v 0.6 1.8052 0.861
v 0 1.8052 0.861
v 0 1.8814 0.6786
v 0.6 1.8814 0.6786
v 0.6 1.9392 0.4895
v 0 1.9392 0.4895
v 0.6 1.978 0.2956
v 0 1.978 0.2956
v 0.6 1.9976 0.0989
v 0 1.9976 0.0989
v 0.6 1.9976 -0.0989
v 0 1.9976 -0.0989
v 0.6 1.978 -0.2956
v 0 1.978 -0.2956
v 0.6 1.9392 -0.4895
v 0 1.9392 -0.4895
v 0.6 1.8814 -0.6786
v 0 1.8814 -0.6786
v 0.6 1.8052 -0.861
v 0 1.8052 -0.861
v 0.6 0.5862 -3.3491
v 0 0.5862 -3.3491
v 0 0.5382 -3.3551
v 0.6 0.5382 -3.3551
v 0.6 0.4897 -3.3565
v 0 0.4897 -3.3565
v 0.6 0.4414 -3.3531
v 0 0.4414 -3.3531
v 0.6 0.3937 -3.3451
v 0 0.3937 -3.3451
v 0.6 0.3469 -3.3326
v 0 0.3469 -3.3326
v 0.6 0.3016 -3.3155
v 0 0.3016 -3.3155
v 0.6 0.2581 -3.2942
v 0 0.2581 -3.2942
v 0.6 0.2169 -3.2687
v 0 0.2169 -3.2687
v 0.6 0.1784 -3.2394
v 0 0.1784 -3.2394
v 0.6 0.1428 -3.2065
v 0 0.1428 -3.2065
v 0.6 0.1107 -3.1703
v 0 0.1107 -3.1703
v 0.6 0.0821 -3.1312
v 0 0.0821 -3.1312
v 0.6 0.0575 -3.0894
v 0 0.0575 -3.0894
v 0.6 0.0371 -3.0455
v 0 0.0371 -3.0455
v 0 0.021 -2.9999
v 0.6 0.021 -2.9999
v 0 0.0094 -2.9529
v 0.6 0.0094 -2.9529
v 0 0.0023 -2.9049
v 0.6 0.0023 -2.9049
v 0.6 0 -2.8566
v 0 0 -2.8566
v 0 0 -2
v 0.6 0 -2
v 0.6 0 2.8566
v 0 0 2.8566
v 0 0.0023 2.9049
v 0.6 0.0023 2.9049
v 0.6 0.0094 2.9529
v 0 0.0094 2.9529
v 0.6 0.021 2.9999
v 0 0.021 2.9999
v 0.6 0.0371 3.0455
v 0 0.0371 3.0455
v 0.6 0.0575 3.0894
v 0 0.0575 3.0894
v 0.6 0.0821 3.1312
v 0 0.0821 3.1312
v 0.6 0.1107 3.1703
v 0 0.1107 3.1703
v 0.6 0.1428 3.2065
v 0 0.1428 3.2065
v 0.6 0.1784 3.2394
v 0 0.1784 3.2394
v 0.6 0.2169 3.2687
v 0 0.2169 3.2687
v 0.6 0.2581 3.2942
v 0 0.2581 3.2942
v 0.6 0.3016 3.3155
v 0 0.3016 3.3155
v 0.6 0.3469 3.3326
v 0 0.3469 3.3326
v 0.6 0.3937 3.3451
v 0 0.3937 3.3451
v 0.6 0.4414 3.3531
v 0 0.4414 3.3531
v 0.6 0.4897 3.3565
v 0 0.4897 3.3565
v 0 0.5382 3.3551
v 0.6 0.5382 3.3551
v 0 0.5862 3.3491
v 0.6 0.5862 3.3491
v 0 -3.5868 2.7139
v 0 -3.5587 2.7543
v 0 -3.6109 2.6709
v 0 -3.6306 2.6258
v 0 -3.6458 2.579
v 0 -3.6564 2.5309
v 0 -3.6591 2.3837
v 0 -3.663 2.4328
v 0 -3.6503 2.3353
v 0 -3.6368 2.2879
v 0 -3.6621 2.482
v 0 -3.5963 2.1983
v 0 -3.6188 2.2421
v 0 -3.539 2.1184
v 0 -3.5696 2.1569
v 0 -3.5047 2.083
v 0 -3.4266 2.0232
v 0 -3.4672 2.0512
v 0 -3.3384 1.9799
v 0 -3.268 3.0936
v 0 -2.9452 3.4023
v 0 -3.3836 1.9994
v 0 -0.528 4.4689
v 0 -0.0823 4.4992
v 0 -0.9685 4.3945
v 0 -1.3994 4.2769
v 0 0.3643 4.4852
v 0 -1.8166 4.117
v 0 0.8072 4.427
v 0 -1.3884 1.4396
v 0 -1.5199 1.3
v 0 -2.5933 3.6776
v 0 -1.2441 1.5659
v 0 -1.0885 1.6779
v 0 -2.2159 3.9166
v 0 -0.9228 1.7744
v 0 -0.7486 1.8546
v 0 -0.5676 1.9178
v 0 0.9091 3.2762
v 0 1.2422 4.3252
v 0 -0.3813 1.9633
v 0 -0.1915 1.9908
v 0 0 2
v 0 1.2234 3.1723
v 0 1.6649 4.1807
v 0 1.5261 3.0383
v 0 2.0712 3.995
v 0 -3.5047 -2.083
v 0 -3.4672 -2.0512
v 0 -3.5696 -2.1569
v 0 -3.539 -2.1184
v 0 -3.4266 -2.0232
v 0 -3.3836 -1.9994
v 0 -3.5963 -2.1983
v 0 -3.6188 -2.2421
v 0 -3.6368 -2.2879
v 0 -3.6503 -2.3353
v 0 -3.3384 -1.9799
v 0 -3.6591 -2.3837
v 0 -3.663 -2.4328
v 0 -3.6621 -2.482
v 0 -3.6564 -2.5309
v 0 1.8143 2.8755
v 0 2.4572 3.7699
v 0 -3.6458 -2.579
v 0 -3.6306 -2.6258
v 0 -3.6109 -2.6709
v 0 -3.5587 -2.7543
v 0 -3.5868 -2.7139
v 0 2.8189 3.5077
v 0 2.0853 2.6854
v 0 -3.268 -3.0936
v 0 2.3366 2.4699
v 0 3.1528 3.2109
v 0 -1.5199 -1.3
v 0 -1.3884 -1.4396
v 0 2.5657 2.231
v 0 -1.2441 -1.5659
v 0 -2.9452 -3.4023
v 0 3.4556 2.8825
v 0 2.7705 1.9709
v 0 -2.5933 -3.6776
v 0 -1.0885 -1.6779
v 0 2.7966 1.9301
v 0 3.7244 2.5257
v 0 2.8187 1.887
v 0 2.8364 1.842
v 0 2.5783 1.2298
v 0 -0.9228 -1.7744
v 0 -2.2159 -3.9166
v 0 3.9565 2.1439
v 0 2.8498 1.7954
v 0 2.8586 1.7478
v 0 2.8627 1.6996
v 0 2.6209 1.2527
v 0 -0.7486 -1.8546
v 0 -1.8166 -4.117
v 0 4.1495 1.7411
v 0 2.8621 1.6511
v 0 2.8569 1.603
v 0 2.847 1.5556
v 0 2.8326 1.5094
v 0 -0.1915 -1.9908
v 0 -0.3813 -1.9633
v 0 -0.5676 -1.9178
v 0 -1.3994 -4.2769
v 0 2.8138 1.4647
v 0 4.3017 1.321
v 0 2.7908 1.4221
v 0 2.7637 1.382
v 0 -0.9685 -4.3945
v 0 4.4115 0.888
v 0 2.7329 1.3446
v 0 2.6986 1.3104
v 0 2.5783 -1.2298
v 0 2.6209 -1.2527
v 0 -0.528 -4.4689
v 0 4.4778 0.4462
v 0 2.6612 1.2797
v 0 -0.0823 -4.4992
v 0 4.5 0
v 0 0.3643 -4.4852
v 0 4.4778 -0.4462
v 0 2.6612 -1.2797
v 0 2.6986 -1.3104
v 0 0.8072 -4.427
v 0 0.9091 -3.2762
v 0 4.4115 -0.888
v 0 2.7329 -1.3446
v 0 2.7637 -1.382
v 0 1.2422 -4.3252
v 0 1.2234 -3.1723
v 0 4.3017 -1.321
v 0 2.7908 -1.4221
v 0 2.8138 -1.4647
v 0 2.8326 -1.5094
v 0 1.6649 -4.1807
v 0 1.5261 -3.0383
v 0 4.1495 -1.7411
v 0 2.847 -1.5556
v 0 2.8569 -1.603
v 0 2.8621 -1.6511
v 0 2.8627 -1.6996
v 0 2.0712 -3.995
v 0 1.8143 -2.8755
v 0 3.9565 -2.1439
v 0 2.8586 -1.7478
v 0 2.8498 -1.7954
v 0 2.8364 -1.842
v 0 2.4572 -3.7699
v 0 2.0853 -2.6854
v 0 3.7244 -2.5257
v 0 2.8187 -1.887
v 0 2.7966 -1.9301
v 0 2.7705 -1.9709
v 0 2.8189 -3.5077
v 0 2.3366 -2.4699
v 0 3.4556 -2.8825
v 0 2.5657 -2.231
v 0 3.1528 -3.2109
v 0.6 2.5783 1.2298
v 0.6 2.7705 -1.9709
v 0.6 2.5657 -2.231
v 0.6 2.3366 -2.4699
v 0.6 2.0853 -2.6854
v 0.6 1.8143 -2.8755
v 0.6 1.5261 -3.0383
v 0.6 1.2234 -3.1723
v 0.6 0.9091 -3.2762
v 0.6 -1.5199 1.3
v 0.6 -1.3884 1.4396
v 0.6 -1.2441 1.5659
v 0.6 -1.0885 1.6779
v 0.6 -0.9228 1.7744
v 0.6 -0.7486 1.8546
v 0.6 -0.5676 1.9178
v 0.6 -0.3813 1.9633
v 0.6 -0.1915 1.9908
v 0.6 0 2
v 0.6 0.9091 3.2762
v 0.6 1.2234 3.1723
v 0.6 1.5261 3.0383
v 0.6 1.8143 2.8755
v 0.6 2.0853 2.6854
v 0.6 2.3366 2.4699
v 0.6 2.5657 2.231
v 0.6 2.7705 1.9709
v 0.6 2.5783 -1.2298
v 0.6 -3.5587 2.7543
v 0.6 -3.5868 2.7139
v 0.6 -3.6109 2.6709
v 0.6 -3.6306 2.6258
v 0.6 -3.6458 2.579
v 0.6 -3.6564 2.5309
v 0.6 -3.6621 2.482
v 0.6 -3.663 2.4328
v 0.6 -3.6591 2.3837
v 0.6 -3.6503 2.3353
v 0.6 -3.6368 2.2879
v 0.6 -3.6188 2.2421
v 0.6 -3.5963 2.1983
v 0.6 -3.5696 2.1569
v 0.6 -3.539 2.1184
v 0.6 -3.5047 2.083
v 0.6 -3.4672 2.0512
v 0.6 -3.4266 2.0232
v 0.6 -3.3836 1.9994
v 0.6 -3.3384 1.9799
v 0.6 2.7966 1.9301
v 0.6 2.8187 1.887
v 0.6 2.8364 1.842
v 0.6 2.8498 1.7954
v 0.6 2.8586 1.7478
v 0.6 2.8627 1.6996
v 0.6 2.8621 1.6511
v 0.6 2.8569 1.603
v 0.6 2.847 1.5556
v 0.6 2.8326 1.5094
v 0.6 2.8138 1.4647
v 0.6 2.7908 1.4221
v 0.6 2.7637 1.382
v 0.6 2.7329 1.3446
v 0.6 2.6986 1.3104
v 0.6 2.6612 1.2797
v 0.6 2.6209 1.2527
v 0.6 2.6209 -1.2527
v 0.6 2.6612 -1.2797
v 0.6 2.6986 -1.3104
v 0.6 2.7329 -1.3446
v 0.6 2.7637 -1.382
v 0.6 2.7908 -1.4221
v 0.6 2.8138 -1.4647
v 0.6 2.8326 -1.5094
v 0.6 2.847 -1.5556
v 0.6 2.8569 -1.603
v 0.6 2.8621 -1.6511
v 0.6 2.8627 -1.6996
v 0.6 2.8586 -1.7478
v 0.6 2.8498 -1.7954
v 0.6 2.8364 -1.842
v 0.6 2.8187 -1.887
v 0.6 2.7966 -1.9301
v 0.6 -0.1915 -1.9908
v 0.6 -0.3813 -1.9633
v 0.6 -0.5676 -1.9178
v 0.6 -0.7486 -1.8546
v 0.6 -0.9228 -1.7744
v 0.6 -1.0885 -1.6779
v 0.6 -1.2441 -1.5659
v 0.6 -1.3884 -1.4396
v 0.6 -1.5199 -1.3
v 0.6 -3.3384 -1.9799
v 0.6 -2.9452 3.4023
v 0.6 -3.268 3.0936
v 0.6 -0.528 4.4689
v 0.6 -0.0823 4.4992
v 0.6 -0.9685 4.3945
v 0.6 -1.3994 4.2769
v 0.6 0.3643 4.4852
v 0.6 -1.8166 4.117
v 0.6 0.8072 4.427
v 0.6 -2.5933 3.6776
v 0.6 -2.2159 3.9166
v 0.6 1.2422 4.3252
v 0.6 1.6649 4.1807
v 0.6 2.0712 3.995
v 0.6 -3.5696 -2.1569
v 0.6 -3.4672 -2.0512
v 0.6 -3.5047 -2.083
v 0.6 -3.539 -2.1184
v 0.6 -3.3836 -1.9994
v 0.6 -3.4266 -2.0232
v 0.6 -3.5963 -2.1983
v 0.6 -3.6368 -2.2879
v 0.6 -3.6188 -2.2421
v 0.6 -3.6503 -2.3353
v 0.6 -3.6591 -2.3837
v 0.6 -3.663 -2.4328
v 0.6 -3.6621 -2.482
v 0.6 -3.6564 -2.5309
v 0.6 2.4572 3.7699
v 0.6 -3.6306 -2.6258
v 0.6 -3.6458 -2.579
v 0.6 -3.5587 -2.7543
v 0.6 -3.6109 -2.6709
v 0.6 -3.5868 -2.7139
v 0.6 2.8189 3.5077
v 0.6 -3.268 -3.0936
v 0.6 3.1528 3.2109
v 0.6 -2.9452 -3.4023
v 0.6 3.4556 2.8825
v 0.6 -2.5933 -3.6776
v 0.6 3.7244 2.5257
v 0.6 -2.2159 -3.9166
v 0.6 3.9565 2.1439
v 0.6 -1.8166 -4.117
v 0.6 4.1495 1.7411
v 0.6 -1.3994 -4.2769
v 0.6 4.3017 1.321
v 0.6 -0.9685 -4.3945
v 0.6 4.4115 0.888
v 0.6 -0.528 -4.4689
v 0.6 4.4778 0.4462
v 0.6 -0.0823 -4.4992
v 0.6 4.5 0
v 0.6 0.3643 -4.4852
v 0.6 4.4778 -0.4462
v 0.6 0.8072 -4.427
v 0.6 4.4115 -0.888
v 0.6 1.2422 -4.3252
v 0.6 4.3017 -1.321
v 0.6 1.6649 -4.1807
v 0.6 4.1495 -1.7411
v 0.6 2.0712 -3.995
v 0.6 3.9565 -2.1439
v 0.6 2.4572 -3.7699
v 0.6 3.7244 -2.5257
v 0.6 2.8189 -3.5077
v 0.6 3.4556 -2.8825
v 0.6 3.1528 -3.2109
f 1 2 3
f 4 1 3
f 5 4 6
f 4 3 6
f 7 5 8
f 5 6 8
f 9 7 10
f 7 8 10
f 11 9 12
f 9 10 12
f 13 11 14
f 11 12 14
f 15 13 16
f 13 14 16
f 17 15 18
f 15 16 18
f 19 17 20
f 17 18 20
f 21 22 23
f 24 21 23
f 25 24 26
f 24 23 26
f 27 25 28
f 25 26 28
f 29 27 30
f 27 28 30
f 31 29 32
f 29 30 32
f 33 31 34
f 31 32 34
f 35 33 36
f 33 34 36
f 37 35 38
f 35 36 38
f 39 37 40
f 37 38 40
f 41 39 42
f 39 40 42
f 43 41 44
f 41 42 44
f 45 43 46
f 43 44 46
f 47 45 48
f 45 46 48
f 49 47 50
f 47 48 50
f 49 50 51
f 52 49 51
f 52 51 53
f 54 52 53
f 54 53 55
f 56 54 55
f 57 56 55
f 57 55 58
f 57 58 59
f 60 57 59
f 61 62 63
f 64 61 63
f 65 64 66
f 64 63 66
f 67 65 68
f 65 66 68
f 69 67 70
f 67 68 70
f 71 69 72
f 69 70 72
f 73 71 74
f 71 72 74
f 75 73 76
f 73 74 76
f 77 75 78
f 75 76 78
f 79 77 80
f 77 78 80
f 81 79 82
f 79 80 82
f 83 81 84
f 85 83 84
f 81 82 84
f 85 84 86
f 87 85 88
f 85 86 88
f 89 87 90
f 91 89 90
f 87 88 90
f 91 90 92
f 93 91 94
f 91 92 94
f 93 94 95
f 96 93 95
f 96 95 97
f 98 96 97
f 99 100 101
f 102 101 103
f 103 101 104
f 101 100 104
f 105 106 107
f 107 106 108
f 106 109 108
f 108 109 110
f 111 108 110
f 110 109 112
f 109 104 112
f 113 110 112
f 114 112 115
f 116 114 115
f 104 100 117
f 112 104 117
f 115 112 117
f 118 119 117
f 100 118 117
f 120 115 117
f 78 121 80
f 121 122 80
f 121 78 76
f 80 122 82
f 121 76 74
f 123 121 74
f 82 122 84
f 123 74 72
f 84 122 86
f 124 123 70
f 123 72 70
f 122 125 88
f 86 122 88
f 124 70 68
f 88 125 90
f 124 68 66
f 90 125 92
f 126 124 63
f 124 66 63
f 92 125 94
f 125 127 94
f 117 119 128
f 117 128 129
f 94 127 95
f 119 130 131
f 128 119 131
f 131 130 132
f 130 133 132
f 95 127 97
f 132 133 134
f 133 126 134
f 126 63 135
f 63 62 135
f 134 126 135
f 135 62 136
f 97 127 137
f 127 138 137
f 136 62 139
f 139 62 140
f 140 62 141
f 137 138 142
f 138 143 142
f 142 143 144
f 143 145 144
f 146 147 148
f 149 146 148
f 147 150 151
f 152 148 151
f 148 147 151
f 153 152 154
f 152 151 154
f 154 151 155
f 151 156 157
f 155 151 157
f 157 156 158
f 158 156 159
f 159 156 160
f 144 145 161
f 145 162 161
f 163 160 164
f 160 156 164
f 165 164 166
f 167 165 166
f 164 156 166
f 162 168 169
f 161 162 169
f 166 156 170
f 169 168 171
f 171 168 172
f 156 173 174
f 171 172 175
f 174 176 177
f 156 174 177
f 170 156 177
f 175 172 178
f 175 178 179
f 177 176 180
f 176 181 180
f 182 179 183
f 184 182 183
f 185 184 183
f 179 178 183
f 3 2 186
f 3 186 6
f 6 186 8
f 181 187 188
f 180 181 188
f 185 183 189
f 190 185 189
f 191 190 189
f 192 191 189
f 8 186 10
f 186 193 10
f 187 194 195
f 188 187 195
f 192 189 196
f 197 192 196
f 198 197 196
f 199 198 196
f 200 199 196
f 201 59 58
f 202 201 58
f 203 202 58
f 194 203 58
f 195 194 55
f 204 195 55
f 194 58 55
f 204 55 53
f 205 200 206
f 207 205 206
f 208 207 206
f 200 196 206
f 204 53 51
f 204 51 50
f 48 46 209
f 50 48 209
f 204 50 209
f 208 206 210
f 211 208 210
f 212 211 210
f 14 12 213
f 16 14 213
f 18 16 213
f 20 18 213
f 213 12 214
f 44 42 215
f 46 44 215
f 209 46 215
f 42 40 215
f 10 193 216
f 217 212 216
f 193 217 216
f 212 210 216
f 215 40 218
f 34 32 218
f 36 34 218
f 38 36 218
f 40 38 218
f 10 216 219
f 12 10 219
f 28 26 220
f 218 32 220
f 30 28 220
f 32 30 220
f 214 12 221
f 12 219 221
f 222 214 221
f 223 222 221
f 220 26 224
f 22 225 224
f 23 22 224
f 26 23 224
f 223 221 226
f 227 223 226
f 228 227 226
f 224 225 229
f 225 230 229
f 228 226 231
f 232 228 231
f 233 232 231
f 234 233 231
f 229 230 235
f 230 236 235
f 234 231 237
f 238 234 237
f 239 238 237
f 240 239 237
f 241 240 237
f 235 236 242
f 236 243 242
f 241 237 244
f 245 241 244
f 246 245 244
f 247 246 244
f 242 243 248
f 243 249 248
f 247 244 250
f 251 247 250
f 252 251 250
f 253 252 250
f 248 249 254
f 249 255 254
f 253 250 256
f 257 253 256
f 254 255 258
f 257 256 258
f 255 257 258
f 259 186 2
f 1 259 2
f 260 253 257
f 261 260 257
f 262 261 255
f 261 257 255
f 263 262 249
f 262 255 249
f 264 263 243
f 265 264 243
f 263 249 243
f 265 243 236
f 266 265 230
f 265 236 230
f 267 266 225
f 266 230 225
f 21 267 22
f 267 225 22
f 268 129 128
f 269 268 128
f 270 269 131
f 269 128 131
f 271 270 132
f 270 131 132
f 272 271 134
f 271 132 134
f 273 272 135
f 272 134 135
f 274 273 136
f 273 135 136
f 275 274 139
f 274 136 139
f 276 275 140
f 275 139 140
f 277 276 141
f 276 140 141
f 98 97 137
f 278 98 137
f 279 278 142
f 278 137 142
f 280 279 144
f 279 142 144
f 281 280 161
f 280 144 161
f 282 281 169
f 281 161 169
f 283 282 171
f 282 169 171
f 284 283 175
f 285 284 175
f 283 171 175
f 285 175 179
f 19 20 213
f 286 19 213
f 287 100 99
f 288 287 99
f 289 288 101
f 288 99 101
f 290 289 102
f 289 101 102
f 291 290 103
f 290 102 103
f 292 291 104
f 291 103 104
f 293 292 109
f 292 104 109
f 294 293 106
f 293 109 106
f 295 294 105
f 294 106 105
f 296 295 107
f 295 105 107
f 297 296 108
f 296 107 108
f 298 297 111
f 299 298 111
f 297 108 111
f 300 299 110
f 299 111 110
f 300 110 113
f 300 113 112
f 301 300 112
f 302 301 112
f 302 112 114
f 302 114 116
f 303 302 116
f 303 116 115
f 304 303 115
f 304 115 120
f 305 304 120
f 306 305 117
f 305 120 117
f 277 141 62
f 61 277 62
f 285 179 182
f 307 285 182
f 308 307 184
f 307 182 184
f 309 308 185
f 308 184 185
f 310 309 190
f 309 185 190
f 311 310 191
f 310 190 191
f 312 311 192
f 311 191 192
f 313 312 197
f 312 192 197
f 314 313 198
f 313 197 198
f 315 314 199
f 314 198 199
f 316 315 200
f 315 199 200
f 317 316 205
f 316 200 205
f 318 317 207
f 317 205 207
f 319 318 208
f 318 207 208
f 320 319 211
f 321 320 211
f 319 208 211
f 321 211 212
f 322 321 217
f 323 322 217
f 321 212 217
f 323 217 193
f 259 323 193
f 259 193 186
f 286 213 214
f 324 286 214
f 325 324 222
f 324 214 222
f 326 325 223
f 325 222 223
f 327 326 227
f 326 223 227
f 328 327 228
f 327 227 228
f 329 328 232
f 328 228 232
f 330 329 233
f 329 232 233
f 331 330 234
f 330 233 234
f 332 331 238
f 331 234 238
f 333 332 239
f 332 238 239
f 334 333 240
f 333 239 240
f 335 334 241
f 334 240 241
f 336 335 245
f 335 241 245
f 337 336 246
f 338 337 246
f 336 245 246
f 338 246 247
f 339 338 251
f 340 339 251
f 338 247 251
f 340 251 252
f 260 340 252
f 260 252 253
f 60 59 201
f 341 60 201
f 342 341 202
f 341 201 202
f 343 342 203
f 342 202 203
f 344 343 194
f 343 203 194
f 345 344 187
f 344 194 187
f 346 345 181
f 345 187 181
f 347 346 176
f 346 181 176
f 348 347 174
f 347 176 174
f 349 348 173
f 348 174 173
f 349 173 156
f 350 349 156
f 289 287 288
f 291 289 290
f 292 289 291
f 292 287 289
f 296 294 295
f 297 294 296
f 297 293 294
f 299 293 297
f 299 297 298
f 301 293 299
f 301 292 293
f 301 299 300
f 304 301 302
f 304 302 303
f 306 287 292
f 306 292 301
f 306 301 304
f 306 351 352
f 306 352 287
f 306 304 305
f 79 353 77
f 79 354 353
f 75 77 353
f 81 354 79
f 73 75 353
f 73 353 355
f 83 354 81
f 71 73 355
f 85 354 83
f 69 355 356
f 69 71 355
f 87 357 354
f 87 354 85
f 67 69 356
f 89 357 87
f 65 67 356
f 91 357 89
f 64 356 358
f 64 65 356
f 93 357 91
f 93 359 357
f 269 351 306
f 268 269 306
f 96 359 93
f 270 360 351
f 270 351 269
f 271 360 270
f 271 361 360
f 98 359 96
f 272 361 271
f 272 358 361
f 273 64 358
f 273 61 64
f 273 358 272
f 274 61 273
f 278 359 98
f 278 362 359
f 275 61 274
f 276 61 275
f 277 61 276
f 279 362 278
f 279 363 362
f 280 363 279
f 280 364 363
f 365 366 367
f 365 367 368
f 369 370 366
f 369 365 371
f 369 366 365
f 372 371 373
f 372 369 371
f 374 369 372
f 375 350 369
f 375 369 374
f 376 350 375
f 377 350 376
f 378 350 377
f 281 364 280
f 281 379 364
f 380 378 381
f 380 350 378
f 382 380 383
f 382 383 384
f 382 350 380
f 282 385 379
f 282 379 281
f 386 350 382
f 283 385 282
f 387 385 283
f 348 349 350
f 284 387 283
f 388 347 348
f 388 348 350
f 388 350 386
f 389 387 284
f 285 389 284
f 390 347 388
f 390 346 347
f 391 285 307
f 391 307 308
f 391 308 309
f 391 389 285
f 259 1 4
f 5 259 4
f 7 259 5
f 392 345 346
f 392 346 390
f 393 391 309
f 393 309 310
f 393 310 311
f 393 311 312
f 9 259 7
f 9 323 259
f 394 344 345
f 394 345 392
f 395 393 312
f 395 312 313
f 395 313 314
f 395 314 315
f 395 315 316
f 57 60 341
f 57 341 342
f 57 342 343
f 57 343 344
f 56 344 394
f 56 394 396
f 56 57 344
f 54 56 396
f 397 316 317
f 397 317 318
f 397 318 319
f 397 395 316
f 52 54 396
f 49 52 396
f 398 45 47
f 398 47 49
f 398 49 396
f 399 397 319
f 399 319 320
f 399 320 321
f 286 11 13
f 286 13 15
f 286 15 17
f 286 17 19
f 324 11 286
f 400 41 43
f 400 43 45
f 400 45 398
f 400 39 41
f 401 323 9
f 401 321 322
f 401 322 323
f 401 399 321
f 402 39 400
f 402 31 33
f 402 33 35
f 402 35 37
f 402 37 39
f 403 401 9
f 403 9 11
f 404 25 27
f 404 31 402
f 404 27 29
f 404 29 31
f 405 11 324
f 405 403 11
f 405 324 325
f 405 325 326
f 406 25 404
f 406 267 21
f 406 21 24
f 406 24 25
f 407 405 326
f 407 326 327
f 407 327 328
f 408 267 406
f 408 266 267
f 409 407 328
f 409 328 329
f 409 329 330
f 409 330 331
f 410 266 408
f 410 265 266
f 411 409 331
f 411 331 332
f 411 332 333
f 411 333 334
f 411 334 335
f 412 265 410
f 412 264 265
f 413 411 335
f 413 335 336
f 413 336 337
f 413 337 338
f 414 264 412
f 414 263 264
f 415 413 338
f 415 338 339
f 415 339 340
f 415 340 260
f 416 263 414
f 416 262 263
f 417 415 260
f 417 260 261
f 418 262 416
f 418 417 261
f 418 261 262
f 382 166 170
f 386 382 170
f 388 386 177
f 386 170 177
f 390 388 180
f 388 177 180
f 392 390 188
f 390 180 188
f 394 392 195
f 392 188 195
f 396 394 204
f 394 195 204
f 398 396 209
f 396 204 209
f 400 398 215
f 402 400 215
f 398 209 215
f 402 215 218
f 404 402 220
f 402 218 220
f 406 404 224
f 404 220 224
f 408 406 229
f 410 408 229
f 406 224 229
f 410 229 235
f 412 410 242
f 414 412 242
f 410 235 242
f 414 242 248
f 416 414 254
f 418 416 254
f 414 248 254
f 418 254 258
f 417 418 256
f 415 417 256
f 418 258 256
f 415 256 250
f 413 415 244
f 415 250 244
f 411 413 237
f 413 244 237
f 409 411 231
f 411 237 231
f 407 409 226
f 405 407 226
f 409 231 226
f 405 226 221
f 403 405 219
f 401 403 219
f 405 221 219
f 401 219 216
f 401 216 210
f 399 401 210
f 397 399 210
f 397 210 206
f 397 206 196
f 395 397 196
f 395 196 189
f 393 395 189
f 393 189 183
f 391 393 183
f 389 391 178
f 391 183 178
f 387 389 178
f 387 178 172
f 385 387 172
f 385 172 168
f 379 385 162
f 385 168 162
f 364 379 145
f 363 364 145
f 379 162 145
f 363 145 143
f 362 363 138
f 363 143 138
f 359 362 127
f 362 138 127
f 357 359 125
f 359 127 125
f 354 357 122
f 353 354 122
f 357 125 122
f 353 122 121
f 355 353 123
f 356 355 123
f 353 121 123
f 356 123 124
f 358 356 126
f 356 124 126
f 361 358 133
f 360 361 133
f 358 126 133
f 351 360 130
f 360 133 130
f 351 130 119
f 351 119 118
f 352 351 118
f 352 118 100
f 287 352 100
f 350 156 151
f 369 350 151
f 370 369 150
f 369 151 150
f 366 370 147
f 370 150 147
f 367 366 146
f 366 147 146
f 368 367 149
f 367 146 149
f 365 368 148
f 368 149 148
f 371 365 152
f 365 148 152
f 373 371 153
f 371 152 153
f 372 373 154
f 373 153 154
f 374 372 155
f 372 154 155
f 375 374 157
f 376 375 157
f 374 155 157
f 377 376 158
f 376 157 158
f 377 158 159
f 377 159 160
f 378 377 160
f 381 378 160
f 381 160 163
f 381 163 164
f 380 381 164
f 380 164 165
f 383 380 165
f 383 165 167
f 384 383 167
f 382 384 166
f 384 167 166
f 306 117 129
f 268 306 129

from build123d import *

# Parameters (mm, degrees)
BOSS_EXTRUDE1_DEPTH = 0.6


with BuildPart() as part:
    # Sketch1 → Boss-Extrude1 (new body)
    with BuildSketch(Plane(origin=(0, 0, 0), x_dir=(0, 0, -1), z_dir=(1, 0, 0))):
        with BuildLine():
            Line((2.856571371, 0), (2, 0))
            ThreePointArc((2, 0), (1.816590212, -0.836660027), (1.3, -1.519868415))
            Line((1.3, -1.519868415), (1.979902452, -3.338350127))
            ThreePointArc((1.979902452, -3.338350127), (2.311420831, -3.644163179), (2.754268365, -3.558652241))
            ThreePointArc((2.754268365, -3.558652241), (0, 4.5), (-2.754268365, -3.558652241))
            ThreePointArc((-2.754268365, -3.558652241), (-2.311420831, -3.644163179), (-1.979902452, -3.338350127))
            Line((-1.979902452, -3.338350127), (-1.3, -1.519868415))
            ThreePointArc((-1.3, -1.519868415), (-1.816590212, -0.836660027), (-2, 0))
            Line((-2, 0), (-2.856571371, 0))
            ThreePointArc((-2.856571371, 0), (-3.239392118, 0.17836624), (-3.349083677, 0.586206897))
            ThreePointArc((-3.349083677, 0.586206897), (-2.875474594, 1.814289354), (-1.970919405, 2.770465069))
            ThreePointArc((-1.970919405, 2.770465069), (-1.555584997, 2.847039011), (-1.229785674, 2.578299284))
            Line((-1.229785674, 2.578299284), (-0.861022194, 1.805170569))
            ThreePointArc((-0.861022194, 1.805170569), (0, 2), (0.861022194, 1.805170569))
            Line((0.861022194, 1.805170569), (1.229785674, 2.578299284))
            ThreePointArc((1.229785674, 2.578299284), (1.555584997, 2.847039011), (1.970919405, 2.770465069))
            ThreePointArc((1.970919405, 2.770465069), (2.875474594, 1.814289354), (3.349083677, 0.586206897))
            ThreePointArc((3.349083677, 0.586206897), (3.239392118, 0.17836624), (2.856571371, 0))
        make_face()
    extrude(amount=BOSS_EXTRUDE1_DEPTH)


solid = part.part
